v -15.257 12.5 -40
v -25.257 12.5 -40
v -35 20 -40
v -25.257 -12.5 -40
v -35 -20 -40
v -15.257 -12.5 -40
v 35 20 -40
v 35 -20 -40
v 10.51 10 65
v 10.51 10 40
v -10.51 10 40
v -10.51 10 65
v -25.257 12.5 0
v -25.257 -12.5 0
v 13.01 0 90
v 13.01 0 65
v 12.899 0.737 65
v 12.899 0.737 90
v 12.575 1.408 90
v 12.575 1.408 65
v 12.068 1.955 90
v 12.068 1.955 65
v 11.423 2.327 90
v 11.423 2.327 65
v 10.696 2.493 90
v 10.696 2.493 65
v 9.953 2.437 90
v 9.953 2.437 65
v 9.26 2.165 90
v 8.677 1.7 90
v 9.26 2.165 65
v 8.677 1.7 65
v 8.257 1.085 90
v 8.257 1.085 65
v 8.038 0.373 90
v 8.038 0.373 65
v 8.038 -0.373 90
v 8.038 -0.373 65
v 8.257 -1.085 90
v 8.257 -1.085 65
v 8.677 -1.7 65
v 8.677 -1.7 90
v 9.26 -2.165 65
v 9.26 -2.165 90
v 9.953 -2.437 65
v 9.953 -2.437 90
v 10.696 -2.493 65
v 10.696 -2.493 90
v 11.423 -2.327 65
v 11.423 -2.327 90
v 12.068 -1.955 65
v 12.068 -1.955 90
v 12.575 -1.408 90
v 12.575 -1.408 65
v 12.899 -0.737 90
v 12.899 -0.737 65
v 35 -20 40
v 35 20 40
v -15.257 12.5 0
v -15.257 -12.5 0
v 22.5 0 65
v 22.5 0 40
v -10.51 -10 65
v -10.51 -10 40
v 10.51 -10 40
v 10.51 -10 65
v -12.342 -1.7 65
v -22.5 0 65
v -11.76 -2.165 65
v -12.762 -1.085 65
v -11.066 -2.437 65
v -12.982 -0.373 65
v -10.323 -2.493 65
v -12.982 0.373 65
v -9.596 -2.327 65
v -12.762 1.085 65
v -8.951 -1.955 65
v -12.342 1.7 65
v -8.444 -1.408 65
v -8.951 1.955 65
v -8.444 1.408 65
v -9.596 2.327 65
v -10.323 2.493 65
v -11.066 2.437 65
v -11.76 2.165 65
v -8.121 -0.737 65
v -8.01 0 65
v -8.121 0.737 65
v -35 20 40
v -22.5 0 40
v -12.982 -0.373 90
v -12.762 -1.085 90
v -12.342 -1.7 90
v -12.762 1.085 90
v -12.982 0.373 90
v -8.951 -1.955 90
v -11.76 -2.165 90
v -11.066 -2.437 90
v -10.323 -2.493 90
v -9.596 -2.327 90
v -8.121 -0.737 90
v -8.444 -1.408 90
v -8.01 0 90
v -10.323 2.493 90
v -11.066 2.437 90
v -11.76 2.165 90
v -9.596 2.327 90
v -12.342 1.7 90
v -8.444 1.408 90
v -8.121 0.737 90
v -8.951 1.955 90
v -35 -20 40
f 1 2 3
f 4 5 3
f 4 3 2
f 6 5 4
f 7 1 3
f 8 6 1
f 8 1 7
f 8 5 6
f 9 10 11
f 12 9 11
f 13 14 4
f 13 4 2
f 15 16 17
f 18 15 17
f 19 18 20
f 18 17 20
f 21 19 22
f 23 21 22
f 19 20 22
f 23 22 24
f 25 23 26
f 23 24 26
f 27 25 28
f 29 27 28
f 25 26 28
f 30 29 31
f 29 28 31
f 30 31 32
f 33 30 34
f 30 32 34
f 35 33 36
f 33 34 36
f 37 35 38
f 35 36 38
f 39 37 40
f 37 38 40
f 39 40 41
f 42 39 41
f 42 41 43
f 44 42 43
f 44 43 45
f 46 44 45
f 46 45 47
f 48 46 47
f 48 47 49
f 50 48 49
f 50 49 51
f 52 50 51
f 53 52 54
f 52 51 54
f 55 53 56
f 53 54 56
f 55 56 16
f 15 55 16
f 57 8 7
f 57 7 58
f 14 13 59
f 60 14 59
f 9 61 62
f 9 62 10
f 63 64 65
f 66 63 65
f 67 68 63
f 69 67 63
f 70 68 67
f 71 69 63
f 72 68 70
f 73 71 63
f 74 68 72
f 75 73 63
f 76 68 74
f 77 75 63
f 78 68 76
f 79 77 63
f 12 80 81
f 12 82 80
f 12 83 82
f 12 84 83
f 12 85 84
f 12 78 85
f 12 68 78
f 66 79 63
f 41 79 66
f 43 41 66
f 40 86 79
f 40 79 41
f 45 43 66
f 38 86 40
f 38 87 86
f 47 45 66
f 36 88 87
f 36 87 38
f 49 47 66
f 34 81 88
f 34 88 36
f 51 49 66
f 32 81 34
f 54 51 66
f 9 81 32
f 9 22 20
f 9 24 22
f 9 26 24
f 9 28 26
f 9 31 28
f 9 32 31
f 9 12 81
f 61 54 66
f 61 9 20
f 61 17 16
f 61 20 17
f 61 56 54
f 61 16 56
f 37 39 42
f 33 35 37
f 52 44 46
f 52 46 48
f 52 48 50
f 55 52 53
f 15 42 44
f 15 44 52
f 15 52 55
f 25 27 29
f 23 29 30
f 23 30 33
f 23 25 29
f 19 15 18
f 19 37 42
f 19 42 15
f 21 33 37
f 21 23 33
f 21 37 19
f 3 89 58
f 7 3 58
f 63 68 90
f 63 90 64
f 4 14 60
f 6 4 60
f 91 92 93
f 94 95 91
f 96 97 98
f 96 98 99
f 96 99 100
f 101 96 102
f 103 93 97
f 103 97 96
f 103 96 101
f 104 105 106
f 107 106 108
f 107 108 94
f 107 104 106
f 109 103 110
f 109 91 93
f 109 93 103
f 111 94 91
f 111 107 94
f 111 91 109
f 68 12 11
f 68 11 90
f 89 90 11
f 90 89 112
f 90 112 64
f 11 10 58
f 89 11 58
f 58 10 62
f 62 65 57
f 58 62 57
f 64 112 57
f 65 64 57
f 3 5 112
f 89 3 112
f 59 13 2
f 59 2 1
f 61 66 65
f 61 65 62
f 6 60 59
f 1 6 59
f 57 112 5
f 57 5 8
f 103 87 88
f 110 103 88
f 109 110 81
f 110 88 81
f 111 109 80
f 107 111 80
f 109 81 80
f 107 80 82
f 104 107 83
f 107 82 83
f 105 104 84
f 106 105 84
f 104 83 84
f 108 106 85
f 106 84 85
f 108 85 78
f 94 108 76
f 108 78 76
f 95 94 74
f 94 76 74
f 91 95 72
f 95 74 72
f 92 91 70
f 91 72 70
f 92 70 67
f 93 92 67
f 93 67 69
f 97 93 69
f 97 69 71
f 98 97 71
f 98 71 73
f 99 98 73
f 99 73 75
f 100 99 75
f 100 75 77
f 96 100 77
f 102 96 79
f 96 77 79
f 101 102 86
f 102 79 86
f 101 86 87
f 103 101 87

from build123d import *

# Parameters (mm, degrees)
F0_W     = 70
F0_H     = 80
F1_DEPTH = 20
F3_DEPTH = 25
F4_R     = 2.5
F5_DEPTH = 25
F6_W     = 10
F6_H     = 25
F7_DEPTH = 79.4


with BuildPart() as f1:
    # F0 (on Front) → F1 (new body, symmetric)
    with BuildSketch(Plane.XZ):
        Rectangle(F0_W, F0_H)
    extrude(amount=F1_DEPTH, both=True)

    # F2 (on face) → F3 (join)
    with BuildSketch(Plane.XY.offset(40)):
        Polygon((22.5, 0), (10.509629, 10), (-10.509629, 10), (-22.5, 0), (-10.509629, -10), (10.509629, -10), align=None)
    extrude(amount=F3_DEPTH)

    # F4 (on face) → F5 (join)
    with BuildSketch(Plane.XY.offset(65)):
        with Locations((-10.509629, 0)):
            Circle(F4_R)
        with Locations((10.509629, 0)):
            Circle(F4_R)
    extrude(amount=F5_DEPTH)

    # F6 (on Top) → F7 (cut)
    with BuildSketch(Plane.XY):
        with Locations((-20.256918, 0)):
            Rectangle(F6_W, F6_H)
    extrude(amount=-F7_DEPTH, mode=Mode.SUBTRACT)


solid = f1.part
